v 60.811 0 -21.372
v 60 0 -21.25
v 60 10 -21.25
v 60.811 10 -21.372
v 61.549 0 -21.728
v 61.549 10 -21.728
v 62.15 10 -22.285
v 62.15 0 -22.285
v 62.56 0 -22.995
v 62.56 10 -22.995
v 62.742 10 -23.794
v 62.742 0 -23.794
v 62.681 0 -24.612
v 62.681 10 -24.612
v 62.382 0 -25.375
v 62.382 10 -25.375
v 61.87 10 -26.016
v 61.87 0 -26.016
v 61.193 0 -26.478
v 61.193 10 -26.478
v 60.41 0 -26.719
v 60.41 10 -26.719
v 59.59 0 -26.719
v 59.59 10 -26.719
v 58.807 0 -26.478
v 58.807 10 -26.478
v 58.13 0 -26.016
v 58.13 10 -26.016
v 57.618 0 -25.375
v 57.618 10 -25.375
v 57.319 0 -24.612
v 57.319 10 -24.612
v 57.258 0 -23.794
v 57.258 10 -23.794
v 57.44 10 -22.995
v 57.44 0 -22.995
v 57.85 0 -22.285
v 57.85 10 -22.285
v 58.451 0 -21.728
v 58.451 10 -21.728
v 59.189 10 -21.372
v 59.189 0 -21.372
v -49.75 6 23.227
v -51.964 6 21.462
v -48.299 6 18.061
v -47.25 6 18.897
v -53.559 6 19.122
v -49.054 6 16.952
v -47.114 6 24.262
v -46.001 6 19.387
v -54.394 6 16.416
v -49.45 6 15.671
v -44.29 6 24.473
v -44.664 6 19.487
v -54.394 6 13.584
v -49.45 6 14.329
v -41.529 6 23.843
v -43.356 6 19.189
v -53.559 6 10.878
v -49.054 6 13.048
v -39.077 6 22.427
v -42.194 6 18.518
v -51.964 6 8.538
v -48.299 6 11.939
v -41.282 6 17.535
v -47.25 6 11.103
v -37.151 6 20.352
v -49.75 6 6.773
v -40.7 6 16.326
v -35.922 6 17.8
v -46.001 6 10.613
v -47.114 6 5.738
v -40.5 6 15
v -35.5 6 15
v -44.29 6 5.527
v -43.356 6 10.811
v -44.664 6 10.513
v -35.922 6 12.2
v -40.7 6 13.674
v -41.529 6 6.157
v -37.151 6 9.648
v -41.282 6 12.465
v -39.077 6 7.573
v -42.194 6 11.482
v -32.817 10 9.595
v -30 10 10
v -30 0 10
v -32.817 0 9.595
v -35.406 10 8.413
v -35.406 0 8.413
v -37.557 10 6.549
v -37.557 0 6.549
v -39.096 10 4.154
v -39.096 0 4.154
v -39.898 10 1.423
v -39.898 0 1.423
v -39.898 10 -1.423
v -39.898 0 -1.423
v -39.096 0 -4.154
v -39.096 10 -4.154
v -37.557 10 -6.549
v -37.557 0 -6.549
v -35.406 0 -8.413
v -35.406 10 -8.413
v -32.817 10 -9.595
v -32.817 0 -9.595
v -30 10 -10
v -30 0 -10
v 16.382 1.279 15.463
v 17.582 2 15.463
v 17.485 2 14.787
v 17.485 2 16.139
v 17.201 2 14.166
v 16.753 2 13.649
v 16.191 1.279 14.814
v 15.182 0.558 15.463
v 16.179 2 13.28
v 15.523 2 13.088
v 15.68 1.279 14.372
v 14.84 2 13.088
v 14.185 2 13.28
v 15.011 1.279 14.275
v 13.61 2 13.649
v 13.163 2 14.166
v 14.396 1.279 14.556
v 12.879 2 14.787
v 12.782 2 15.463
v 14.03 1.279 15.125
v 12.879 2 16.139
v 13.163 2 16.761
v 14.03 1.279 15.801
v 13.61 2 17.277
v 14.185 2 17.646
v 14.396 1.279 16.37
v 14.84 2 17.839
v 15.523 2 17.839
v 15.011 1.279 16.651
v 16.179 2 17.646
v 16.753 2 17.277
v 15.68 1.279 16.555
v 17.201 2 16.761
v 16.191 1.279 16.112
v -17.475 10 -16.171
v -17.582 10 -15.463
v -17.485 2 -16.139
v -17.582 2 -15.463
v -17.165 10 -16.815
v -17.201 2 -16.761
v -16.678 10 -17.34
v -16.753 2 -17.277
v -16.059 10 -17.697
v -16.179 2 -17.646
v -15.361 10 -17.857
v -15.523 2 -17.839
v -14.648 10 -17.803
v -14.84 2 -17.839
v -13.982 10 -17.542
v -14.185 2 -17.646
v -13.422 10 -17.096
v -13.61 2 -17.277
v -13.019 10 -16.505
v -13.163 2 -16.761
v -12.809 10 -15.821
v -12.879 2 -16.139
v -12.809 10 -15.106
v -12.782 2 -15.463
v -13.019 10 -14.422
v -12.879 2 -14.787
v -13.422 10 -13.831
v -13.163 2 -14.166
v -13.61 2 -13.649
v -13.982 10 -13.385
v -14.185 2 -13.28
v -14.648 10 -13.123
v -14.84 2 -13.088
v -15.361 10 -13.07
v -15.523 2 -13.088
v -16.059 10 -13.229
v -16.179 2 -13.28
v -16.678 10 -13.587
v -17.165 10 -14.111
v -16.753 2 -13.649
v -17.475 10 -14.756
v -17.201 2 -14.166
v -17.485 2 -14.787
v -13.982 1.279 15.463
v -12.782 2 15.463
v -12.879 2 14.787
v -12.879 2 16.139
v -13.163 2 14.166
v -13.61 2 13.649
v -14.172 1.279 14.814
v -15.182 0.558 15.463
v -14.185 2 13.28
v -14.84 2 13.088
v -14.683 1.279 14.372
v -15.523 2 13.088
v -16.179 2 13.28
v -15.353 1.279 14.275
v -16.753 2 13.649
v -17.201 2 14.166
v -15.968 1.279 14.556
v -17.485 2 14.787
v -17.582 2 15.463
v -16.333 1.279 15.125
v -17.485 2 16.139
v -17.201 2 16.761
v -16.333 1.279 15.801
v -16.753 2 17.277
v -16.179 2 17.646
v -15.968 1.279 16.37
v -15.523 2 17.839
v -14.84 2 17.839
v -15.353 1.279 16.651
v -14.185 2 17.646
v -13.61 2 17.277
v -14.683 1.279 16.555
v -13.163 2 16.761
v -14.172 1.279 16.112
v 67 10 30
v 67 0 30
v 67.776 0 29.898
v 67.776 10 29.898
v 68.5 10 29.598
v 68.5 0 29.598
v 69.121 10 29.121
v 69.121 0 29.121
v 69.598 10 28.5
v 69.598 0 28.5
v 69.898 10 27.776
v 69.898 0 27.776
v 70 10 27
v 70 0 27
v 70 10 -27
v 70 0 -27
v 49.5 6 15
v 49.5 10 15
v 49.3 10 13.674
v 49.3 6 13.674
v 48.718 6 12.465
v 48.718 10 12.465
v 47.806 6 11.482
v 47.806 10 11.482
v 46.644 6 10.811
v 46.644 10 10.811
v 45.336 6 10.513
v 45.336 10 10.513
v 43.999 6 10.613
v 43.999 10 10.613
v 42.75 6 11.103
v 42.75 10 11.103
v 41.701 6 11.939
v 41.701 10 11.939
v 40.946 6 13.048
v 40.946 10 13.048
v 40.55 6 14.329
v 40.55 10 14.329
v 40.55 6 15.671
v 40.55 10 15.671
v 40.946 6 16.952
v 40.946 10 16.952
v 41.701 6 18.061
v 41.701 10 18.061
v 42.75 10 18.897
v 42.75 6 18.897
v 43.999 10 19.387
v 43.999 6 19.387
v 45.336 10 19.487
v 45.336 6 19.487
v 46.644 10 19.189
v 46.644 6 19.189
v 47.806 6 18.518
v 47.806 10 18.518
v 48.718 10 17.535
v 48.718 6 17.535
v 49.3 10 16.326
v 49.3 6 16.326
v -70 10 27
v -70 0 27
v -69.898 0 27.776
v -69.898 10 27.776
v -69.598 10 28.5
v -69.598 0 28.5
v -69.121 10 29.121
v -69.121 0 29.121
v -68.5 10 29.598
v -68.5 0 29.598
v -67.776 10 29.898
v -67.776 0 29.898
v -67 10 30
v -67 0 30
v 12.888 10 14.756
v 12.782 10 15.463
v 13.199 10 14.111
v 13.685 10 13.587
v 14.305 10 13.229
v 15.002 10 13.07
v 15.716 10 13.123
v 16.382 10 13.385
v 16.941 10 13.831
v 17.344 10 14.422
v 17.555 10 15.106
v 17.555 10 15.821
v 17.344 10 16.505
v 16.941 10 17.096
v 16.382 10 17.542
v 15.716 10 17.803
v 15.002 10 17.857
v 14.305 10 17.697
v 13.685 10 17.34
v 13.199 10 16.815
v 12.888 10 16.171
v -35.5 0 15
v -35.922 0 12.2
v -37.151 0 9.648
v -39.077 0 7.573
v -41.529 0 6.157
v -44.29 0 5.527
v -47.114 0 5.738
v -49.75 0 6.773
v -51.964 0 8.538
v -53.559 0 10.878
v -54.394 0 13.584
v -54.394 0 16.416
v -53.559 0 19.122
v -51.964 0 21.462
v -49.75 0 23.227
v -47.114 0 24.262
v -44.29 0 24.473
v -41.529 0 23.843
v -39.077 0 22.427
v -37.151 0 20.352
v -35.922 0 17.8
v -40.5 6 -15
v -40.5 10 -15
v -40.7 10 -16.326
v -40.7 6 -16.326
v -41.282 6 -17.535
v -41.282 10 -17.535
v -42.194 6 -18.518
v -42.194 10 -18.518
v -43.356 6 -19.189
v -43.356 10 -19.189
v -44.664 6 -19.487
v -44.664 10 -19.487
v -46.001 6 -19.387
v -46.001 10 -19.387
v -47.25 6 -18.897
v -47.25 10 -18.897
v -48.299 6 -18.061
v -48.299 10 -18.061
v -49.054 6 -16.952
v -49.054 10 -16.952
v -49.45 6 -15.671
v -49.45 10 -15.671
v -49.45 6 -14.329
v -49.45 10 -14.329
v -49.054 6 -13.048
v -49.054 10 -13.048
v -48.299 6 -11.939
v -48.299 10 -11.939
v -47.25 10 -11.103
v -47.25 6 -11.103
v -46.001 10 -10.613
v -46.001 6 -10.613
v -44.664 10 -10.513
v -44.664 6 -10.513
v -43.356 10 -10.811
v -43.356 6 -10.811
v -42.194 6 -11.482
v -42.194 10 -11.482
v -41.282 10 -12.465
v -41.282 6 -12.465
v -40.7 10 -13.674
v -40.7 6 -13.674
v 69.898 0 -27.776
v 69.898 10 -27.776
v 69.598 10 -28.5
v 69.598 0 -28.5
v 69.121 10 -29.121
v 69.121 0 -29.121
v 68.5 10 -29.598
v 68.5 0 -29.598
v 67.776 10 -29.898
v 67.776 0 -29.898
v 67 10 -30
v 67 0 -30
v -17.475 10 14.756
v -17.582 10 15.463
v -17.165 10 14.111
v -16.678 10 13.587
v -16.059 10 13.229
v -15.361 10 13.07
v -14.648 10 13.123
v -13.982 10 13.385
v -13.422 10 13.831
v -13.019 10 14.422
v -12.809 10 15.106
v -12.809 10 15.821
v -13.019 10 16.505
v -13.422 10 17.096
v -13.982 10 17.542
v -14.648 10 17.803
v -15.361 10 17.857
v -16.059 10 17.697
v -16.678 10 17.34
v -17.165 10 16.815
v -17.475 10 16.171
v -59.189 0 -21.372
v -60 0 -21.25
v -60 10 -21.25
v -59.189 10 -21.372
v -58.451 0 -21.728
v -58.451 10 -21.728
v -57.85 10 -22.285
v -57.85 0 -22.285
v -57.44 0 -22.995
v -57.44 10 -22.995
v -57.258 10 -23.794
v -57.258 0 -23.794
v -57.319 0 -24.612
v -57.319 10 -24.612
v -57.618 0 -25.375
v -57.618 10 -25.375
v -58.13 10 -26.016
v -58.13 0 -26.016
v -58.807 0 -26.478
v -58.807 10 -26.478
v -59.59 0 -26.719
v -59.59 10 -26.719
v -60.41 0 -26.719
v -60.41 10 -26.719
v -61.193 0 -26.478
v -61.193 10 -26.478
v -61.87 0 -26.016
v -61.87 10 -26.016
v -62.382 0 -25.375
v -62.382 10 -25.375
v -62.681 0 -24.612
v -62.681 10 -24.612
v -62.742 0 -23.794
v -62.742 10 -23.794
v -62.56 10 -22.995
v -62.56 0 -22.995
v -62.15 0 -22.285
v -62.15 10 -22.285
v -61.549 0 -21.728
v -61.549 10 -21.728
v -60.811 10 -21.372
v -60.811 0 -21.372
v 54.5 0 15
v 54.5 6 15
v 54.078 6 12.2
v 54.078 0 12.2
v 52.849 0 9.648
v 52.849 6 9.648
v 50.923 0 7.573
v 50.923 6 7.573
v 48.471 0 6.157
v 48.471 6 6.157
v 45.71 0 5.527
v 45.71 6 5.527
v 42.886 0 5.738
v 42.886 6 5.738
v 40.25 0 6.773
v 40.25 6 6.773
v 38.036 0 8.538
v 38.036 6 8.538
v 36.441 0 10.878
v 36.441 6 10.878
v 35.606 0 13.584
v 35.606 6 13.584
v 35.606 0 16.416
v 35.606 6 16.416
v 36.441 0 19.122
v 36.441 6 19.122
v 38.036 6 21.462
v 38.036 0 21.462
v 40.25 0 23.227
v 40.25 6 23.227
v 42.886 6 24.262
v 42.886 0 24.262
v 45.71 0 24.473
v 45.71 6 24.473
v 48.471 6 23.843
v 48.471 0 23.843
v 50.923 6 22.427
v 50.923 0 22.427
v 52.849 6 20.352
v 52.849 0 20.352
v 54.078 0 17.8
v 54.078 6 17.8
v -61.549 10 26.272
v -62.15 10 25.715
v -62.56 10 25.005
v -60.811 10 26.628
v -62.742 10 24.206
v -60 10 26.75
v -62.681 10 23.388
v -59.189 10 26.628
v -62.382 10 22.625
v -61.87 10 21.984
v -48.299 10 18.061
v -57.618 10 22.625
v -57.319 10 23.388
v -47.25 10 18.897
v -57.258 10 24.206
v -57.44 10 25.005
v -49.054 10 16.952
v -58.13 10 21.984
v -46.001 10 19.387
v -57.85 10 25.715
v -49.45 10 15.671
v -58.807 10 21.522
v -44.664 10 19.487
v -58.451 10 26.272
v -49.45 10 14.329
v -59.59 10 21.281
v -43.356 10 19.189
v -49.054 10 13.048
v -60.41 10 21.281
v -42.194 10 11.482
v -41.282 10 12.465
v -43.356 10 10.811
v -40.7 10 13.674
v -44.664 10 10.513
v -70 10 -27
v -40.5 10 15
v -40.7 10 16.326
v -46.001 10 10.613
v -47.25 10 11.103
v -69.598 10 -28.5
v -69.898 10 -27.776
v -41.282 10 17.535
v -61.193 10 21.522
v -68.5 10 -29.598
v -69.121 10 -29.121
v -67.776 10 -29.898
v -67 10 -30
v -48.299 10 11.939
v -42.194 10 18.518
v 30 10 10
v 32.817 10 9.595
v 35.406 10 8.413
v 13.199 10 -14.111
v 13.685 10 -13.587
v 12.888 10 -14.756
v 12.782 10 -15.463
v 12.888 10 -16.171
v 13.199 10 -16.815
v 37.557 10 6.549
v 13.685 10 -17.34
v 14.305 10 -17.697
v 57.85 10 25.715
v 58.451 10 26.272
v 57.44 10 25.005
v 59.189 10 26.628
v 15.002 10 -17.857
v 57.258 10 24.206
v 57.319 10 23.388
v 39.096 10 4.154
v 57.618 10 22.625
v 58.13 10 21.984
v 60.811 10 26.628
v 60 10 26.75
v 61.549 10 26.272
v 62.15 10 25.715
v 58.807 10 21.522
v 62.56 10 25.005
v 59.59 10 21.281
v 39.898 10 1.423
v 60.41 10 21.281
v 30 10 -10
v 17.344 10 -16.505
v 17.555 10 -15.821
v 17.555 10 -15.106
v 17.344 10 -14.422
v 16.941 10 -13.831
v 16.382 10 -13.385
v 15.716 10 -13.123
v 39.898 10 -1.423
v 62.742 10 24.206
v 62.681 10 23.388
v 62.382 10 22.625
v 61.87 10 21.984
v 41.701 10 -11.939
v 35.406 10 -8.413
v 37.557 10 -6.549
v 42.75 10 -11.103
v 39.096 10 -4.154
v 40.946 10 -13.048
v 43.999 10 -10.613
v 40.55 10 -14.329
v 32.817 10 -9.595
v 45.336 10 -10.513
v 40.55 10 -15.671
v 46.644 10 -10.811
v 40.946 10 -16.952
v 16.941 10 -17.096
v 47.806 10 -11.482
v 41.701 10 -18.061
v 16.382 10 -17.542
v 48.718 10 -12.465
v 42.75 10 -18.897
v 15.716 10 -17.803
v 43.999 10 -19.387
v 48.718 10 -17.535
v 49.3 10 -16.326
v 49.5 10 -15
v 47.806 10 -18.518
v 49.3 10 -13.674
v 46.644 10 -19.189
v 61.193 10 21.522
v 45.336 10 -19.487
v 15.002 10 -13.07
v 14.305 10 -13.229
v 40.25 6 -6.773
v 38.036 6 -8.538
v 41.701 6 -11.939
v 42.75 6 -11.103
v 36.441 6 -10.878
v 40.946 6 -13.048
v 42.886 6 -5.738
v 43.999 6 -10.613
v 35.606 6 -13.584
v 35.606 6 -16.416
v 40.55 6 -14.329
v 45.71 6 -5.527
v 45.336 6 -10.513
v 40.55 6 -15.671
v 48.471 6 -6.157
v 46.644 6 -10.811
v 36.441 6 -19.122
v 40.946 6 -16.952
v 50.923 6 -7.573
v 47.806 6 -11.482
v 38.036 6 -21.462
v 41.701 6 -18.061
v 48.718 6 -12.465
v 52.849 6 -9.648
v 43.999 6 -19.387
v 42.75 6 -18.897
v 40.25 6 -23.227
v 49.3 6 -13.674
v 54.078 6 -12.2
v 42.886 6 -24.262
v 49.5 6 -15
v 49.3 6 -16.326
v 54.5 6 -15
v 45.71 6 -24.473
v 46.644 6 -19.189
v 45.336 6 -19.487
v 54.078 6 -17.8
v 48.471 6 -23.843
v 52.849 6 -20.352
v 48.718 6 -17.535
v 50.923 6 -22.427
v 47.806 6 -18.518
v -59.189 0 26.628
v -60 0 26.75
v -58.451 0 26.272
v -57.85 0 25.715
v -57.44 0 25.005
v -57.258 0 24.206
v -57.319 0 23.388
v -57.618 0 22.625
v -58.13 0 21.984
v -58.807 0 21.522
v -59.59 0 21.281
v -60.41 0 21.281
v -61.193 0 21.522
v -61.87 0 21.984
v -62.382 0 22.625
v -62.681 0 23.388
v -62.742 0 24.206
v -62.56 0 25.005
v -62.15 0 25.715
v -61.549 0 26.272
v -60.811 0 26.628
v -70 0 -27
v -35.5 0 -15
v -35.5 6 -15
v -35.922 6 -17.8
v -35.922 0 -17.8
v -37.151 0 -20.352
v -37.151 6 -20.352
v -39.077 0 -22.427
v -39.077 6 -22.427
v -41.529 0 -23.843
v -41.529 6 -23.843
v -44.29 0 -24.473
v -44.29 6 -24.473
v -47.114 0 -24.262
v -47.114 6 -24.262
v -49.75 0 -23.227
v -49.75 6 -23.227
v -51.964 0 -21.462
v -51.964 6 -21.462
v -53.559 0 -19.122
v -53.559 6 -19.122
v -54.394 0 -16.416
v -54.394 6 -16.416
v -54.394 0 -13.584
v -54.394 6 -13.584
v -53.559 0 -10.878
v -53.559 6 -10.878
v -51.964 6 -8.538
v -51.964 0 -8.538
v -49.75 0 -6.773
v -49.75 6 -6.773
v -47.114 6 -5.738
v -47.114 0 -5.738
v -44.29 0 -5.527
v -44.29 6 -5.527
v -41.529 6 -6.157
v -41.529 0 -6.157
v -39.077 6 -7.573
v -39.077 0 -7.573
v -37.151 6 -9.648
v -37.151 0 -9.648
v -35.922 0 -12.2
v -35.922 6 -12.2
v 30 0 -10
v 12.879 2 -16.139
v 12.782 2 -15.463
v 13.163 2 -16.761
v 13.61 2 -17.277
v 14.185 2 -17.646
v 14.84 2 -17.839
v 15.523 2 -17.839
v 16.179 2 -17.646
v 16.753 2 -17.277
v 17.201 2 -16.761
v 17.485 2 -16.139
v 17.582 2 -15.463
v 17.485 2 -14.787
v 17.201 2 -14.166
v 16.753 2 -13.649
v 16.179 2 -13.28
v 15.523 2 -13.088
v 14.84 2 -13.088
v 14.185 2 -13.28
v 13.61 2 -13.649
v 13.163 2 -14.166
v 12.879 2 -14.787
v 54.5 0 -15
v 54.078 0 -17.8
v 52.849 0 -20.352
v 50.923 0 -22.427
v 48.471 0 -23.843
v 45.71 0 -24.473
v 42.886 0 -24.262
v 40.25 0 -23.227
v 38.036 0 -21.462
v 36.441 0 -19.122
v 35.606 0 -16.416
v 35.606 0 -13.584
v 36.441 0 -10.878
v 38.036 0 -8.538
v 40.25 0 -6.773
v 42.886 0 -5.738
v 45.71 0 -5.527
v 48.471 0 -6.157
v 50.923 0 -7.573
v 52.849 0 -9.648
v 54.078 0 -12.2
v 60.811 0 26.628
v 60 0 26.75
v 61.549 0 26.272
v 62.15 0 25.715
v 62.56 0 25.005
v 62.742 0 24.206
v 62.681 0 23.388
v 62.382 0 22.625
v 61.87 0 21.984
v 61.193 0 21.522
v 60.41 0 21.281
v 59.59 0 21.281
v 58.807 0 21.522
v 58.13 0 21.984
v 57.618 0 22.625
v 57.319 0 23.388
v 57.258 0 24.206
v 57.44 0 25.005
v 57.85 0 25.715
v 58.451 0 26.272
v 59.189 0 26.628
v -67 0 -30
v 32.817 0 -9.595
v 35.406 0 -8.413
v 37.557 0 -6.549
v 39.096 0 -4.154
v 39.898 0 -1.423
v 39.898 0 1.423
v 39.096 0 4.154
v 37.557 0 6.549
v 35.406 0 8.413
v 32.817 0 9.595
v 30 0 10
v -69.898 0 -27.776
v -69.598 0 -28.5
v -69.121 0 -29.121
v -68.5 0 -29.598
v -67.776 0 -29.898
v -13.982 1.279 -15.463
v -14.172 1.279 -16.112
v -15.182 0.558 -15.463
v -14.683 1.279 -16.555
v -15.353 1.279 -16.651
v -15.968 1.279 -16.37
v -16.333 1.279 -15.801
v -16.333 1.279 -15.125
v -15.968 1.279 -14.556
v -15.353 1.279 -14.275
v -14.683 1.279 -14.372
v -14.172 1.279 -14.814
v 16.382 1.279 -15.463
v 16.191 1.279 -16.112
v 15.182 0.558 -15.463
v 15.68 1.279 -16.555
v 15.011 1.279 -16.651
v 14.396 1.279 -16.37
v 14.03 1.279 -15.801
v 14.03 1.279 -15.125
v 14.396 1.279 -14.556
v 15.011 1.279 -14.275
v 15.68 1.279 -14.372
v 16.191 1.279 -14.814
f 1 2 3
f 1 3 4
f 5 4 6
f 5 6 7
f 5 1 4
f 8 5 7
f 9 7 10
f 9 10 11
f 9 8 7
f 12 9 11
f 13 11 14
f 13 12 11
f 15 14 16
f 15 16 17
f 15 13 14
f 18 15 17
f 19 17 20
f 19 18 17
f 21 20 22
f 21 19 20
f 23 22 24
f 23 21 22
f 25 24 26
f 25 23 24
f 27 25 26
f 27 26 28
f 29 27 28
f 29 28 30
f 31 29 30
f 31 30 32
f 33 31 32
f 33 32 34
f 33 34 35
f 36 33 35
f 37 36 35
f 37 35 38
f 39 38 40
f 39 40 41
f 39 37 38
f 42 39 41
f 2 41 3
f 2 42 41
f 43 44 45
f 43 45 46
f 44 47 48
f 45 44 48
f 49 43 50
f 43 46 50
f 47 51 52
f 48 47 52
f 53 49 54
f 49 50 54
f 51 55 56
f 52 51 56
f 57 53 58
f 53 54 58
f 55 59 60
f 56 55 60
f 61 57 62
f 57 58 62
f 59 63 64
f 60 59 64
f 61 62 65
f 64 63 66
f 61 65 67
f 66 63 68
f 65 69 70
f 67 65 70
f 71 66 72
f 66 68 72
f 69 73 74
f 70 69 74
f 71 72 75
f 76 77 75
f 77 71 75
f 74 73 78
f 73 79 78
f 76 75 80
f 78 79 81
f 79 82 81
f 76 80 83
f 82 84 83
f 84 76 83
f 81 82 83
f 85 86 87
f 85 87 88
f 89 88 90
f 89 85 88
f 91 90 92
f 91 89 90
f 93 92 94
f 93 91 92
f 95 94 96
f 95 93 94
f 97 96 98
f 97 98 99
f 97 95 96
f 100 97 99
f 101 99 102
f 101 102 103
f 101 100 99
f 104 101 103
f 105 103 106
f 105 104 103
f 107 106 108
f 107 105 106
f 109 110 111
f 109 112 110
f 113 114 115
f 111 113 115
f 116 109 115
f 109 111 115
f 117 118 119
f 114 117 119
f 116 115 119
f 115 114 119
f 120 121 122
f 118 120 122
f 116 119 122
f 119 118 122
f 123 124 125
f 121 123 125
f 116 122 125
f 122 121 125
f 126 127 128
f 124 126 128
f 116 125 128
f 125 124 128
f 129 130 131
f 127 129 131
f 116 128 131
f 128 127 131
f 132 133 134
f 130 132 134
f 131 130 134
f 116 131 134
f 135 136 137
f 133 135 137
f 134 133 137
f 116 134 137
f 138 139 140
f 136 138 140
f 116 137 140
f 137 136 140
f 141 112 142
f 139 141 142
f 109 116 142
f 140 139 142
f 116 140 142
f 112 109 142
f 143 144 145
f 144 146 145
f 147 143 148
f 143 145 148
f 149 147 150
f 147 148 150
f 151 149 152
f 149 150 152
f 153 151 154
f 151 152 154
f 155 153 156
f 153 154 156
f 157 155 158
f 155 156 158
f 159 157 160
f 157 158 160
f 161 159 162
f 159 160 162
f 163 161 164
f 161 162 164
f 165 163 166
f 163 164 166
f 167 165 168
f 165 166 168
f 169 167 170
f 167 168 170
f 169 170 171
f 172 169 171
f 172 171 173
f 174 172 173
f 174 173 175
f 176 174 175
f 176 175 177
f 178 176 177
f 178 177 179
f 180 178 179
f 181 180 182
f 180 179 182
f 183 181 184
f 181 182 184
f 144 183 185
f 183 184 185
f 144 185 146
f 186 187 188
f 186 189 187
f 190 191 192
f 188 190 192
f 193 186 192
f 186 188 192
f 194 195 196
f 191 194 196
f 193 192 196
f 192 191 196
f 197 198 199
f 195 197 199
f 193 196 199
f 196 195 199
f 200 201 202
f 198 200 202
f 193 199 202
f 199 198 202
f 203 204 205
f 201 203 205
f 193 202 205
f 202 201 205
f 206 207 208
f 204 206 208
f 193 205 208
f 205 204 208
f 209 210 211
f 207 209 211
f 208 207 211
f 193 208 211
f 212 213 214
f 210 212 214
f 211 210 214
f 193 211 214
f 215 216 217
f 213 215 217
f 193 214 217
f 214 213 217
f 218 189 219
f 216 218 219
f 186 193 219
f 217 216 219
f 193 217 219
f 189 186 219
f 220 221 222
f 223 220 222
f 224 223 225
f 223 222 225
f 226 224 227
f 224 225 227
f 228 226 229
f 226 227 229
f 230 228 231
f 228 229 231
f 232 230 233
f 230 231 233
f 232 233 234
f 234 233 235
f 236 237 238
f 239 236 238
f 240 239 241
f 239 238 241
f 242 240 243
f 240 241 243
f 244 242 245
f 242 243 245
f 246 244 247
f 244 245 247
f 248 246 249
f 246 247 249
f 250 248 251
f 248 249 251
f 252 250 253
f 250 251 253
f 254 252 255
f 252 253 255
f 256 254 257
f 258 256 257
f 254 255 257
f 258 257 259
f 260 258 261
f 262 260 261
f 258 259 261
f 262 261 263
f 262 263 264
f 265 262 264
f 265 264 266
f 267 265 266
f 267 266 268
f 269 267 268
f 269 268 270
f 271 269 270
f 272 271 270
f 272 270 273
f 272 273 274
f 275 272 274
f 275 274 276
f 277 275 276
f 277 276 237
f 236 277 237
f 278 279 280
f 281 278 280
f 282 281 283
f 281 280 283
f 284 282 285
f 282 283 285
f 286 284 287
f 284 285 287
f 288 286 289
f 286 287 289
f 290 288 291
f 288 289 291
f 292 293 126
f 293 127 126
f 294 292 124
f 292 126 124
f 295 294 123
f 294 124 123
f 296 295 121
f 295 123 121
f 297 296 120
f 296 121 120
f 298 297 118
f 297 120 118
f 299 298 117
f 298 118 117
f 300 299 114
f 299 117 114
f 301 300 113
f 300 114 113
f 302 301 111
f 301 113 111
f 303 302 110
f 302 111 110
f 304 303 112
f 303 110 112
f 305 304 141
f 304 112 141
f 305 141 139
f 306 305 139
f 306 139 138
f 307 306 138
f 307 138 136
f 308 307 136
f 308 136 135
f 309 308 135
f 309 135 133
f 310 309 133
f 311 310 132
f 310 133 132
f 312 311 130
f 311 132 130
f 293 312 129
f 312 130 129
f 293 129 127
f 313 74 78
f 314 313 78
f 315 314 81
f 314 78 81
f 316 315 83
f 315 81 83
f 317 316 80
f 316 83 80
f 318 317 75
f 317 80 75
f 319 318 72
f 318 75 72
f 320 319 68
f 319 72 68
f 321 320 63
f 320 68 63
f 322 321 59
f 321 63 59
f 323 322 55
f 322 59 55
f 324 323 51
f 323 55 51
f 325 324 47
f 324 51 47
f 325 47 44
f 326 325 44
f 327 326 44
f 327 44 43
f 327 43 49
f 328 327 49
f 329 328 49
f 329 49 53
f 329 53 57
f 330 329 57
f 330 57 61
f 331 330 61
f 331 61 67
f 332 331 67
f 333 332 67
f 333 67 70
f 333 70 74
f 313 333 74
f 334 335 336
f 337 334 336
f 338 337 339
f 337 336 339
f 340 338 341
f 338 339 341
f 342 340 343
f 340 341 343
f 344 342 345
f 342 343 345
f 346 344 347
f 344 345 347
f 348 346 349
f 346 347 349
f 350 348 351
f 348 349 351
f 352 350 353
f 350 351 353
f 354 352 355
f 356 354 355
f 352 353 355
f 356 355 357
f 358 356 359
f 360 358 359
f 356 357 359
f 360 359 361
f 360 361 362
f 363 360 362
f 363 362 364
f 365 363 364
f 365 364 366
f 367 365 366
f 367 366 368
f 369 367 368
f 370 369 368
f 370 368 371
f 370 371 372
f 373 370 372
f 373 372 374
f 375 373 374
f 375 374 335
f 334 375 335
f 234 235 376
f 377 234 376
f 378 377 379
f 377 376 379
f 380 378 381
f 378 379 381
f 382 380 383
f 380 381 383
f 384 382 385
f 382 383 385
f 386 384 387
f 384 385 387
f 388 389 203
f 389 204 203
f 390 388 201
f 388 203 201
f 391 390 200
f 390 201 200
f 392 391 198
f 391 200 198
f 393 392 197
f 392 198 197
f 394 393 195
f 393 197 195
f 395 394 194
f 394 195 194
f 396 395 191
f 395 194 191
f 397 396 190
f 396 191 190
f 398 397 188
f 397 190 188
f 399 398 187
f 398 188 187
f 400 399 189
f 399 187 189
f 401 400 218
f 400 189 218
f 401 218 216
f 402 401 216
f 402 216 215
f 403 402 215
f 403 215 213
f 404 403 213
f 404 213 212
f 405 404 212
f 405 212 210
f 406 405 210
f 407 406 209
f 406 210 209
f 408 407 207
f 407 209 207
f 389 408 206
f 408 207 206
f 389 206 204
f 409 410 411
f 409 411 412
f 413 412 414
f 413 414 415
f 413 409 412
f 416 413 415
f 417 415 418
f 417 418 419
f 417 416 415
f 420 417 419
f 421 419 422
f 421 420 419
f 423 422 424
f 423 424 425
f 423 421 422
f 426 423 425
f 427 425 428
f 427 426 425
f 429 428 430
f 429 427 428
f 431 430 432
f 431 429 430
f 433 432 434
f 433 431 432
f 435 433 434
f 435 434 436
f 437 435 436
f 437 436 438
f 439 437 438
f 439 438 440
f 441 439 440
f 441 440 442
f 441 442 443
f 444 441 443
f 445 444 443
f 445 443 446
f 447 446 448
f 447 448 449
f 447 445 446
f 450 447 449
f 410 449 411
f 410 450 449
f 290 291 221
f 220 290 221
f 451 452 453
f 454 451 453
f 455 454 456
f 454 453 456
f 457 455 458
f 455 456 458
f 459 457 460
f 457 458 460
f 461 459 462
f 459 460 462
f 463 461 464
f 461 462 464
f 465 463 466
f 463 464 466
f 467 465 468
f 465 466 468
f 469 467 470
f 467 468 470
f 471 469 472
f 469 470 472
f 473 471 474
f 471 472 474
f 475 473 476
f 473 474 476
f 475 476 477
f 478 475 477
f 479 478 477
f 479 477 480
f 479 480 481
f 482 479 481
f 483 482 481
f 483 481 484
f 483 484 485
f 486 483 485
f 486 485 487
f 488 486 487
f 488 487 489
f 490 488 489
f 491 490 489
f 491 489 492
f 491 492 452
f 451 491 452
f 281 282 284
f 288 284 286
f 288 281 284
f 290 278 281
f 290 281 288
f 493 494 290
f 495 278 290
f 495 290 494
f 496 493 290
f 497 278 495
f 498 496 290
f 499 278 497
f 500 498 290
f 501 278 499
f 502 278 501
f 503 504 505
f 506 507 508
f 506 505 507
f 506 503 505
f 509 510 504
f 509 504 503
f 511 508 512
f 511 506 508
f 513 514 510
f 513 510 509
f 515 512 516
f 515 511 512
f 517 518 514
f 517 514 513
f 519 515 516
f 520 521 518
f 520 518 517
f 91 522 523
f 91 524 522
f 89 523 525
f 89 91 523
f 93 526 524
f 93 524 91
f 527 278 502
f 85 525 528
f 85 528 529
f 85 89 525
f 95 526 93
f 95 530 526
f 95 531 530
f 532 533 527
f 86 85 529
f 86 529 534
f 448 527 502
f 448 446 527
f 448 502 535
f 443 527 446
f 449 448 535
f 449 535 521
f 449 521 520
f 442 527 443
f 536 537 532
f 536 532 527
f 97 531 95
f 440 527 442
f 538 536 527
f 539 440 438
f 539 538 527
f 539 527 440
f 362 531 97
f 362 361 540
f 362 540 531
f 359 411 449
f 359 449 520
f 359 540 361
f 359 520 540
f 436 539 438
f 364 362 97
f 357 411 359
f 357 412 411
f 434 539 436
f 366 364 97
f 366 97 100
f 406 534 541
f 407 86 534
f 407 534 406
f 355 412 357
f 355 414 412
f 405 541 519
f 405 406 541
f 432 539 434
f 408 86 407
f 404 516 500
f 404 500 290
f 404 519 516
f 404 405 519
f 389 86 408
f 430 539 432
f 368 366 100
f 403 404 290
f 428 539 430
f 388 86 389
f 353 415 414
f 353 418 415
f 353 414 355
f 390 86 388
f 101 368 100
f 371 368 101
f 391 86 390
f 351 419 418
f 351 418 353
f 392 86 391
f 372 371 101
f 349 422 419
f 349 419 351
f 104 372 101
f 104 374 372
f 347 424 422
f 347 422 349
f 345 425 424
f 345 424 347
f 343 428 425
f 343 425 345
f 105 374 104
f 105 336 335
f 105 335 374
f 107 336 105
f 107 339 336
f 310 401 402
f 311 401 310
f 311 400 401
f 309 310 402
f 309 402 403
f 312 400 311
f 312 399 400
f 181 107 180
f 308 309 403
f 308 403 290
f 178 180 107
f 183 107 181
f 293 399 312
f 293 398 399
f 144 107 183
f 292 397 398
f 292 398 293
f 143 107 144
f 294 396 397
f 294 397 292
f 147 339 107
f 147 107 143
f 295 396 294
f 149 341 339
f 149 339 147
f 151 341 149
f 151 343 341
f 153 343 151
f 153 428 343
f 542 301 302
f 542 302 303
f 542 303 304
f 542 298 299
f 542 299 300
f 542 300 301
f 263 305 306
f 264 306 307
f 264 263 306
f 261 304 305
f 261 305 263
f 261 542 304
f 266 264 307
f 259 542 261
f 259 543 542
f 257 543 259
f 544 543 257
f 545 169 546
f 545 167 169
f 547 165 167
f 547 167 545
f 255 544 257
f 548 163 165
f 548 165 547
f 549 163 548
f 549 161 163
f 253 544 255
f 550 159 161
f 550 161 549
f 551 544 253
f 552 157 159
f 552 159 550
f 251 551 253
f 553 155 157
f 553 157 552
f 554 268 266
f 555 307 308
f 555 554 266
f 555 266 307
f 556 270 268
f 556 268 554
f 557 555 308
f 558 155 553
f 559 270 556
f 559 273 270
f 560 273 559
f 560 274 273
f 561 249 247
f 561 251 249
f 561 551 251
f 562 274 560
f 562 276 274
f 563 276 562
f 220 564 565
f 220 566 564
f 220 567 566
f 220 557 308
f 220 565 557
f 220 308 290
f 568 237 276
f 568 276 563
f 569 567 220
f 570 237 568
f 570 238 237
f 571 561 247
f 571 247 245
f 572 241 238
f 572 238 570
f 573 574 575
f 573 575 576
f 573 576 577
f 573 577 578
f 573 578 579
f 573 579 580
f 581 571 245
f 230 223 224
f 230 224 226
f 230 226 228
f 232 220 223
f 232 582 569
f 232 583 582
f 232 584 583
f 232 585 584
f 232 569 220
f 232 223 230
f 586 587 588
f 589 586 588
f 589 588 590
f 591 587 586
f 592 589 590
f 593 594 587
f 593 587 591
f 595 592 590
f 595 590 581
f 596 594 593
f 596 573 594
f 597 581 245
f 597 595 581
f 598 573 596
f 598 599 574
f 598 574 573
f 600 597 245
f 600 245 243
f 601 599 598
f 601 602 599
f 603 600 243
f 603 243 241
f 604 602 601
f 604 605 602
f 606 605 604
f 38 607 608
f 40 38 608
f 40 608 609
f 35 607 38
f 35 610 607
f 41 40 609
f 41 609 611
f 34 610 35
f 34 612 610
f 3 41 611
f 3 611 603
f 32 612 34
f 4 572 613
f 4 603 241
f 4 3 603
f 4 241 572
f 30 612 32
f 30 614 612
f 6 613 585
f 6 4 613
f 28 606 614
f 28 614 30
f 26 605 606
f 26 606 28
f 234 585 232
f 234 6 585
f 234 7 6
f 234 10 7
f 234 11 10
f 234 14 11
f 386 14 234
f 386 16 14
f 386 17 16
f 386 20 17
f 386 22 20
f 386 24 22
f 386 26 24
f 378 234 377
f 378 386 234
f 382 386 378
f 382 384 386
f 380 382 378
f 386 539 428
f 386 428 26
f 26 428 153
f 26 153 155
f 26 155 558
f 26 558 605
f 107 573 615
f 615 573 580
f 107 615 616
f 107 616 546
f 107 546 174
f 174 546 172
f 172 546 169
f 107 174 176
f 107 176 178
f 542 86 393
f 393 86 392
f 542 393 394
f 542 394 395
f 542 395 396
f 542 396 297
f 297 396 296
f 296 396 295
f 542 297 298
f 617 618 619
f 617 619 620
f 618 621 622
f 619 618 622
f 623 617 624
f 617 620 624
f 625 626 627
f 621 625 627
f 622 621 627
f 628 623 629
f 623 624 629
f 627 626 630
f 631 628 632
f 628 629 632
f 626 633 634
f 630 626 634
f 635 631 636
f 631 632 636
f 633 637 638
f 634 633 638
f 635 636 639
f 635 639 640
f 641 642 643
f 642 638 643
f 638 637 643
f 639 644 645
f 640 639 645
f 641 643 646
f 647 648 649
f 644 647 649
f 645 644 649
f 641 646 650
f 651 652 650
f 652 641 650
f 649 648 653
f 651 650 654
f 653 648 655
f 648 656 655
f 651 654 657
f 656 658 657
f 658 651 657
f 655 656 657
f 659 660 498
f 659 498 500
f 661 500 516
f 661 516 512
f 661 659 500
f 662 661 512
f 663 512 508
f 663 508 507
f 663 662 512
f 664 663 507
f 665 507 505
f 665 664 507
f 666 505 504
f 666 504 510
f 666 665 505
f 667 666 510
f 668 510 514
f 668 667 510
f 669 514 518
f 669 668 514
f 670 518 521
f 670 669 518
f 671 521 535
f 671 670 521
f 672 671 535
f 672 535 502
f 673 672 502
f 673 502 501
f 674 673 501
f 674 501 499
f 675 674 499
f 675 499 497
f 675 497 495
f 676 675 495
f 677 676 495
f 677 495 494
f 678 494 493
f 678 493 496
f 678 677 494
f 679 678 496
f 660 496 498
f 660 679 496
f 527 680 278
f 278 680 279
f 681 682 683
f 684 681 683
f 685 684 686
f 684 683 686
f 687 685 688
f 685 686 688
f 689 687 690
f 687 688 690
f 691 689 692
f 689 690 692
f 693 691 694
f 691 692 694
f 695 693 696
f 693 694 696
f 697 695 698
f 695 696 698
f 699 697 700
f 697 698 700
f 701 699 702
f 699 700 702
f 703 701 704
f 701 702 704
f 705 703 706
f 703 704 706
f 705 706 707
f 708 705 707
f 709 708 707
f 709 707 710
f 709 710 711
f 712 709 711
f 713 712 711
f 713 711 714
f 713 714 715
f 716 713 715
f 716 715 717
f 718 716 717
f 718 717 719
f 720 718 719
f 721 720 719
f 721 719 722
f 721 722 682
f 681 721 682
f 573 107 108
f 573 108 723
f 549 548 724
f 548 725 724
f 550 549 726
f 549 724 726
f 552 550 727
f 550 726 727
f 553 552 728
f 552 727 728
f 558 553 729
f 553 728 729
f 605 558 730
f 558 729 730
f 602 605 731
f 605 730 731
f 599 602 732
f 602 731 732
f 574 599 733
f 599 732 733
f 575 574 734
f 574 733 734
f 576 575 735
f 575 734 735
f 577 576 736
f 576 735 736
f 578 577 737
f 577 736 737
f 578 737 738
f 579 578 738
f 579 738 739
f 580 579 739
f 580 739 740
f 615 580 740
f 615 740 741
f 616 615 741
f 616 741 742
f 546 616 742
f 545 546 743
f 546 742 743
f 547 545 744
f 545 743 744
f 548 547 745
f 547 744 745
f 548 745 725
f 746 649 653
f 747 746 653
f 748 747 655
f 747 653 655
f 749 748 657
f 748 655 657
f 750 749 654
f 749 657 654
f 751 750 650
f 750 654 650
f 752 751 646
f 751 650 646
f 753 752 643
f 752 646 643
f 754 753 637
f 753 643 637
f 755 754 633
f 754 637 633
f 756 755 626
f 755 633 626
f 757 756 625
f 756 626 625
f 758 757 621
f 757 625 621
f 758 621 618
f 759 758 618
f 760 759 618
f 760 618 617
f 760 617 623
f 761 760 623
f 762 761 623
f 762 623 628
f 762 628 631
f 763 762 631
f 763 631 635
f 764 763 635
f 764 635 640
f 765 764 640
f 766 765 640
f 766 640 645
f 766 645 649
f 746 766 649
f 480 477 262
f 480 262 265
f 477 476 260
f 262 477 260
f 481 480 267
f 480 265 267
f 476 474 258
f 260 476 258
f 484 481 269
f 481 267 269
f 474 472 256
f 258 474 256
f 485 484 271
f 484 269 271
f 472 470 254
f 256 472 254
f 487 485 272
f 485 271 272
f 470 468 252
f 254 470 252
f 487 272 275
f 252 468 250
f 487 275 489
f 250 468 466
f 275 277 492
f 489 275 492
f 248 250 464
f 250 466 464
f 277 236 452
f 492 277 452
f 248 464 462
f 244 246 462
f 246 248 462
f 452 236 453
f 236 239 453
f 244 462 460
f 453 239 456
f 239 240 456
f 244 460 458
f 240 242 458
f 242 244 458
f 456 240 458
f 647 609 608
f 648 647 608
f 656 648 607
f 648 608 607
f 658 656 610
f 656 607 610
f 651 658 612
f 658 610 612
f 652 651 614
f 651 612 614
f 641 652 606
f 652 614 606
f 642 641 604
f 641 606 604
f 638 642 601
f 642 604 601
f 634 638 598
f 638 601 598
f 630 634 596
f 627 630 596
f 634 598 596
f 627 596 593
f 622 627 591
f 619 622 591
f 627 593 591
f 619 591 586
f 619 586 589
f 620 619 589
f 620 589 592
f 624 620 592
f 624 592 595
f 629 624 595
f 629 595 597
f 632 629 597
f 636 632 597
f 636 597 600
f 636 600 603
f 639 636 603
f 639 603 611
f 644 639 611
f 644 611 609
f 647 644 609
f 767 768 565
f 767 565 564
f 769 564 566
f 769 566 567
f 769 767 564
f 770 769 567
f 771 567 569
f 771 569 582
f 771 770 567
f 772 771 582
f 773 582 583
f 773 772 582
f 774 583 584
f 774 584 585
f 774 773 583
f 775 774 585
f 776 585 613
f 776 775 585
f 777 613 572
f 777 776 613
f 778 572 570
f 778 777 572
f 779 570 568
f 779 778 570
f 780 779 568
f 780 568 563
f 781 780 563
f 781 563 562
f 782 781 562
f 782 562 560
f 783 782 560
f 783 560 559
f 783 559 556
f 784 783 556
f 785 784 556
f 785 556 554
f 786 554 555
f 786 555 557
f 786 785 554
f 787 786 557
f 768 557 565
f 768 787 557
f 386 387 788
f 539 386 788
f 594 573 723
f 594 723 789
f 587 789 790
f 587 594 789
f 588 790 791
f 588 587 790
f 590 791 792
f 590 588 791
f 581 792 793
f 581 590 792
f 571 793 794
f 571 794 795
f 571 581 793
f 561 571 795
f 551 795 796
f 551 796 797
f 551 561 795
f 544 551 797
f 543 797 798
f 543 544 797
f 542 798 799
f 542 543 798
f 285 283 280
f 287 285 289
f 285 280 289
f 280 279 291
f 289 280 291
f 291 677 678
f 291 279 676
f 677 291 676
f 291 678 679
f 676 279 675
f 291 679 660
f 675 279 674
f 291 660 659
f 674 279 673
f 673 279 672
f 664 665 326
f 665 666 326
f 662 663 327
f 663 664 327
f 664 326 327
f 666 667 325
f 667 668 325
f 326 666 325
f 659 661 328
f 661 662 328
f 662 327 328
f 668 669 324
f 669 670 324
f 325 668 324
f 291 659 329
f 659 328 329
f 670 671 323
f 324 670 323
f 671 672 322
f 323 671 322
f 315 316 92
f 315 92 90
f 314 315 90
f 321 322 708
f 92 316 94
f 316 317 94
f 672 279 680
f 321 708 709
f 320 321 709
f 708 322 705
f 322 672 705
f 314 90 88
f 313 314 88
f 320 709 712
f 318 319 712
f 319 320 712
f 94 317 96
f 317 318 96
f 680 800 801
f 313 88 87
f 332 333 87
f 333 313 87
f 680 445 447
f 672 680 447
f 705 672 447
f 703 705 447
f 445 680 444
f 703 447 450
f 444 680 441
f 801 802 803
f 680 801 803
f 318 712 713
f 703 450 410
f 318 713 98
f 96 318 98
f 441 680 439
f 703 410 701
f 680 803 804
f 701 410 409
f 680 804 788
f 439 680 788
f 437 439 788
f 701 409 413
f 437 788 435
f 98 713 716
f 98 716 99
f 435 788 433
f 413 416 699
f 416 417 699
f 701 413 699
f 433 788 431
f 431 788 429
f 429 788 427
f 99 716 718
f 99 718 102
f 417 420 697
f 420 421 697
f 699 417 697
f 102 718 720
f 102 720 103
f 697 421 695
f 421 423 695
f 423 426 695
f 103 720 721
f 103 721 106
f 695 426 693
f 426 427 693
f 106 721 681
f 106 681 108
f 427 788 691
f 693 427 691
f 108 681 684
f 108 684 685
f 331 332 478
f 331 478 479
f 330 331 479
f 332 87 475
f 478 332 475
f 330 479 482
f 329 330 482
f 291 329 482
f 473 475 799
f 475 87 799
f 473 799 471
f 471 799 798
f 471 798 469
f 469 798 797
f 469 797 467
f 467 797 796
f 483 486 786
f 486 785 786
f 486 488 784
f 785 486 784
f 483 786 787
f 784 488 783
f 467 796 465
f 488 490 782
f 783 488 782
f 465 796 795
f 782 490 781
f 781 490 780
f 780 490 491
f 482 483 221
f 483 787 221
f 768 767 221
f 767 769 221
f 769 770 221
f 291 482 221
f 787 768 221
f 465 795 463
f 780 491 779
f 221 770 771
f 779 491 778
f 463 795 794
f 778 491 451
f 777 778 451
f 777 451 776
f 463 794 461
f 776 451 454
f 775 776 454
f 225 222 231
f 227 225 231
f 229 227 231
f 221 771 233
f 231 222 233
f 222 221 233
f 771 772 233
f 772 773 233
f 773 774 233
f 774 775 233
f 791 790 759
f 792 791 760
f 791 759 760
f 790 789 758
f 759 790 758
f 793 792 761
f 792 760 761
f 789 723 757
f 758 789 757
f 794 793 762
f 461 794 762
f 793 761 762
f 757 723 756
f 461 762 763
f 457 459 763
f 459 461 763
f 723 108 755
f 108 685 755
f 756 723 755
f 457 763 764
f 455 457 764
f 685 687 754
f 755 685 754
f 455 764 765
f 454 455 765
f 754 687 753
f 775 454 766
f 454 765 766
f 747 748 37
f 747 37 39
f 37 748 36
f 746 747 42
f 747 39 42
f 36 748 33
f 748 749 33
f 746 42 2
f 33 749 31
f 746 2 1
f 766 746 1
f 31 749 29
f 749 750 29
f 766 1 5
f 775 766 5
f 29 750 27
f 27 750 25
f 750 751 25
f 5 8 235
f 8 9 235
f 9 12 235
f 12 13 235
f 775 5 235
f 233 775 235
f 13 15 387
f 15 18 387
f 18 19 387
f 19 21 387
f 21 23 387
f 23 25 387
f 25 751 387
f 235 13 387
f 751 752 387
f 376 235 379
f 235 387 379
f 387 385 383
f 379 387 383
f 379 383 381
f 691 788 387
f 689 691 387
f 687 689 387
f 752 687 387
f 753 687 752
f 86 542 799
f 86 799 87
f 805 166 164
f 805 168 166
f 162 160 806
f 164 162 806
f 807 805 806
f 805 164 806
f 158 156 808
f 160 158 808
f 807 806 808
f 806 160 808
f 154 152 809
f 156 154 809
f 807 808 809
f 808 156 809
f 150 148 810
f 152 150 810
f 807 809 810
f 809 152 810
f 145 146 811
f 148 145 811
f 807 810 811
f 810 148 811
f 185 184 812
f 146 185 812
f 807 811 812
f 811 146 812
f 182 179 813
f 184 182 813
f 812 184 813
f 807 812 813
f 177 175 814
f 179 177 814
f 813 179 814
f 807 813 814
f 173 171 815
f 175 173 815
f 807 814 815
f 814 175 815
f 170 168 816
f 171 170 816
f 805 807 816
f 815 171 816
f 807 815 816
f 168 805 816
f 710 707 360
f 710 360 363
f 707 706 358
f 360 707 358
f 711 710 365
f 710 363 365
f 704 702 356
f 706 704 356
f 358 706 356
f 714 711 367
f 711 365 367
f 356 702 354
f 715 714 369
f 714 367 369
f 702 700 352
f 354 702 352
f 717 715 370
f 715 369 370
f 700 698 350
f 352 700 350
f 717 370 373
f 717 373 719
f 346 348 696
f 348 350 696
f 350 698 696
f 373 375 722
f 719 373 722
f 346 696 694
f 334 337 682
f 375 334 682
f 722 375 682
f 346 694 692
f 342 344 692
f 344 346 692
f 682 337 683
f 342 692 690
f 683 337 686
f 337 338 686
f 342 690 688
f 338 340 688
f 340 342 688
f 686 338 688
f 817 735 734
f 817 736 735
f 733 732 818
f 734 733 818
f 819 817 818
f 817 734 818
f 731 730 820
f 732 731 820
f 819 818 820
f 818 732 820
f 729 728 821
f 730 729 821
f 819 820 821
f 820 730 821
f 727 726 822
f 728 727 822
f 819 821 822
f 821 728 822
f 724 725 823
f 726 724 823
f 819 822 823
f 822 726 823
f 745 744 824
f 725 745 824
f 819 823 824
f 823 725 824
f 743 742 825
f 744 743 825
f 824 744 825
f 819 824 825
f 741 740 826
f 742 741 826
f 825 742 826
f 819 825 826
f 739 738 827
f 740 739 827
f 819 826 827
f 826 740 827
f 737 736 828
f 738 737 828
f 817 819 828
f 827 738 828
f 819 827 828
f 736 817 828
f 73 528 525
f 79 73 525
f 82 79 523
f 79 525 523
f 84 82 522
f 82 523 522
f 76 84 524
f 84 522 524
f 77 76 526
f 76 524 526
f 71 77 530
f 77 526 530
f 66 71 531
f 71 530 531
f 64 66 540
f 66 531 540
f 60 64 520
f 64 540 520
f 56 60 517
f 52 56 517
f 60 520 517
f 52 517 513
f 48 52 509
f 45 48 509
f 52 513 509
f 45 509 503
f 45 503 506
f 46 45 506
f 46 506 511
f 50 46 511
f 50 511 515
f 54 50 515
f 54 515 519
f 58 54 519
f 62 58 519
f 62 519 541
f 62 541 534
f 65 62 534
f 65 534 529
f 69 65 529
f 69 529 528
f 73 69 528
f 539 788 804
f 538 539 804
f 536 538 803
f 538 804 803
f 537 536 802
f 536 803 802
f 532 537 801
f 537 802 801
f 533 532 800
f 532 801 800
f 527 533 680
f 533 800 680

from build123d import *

# Parameters (mm, degrees)
SKETCH1_R                  = 2.75
SKETCH1_W                  = 130
SKETCH1_H                  = 38
BOSS_EXTRUDE1_DEPTH        = 10
SKETCH1_2_W                = 130
SKETCH1_2_H                = 38
BOSS_EXTRUDE2_DEPTH        = 10
M3_5_CLEARANCE_HOLE1_D     = 4.8
M3_5_CLEARANCE_HOLE1_DEPTH = 8
M3_5_CLEARANCE_HOLE1_TIP   = 1.442065486
CUT_EXTRUDE1_DEPTH         = 10
M16_CLEARANCE_HOLE1_D      = 19
M16_CLEARANCE_HOLE1_DEPTH  = 6
M8_CLEARANCE_HOLE1_D       = 9


with BuildPart() as part:
    # Sketch1 → Boss-Extrude1 (new body)
    with BuildSketch(Plane(origin=(0, 0, 0), x_dir=(1, 0, 0), z_dir=(0, 1, 0))):
        with BuildLine():
            Line((67, 30), (-67, 30))
            ThreePointArc((-67, 30), (-69.121320344, 29.121320344), (-70, 27))
            Line((-70, 27), (-70, -27))
            ThreePointArc((-70, -27), (-69.121320344, -29.121320344), (-67, -30))
            Line((-67, -30), (67, -30))
            ThreePointArc((67, -30), (69.121320344, -29.121320344), (70, -27))
            Line((70, -27), (70, 27))
            ThreePointArc((70, 27), (69.121320344, 29.121320344), (67, 30))
        make_face()
        with Locations(Location((-60, 24, 0), (0, 0, 270))):
            Circle(SKETCH1_R, mode=Mode.SUBTRACT)
        with Locations(Location((-60, -24, 0), (0, 0, 270))):
            Circle(SKETCH1_R, mode=Mode.SUBTRACT)
        with Locations(Location((60, -24, 0), (0, 0, 270))):
            Circle(SKETCH1_R, mode=Mode.SUBTRACT)
        with Locations(Location((60, 24, 0), (0, 0, 270))):
            Circle(SKETCH1_R, mode=Mode.SUBTRACT)
        Rectangle(SKETCH1_W, SKETCH1_H, mode=Mode.SUBTRACT)
    extrude(amount=BOSS_EXTRUDE1_DEPTH)

    # Sketch1<2> → Boss-Extrude2 (add)
    with BuildSketch(Plane(origin=(0, 0, 0), x_dir=(1, 0, 0), z_dir=(0, 1, 0))):
        Rectangle(SKETCH1_2_W, SKETCH1_2_H)
    extrude(amount=BOSS_EXTRUDE2_DEPTH)

    # M3.5 Clearance Hole1
    with Locations(Plane(origin=(0, 10, 0), x_dir=(1, 0, 0), z_dir=(0, 1, 0))):
        with Locations((0, 0), (-15.181752664, -15.463217926), (15.181752664, 15.463217926), (15.181752664, -15.463217926), (-15.181752664, 15.463217926)):
            Hole(M3_5_CLEARANCE_HOLE1_D / 2, depth=M3_5_CLEARANCE_HOLE1_DEPTH)
            with Locations((0, 0, -(M3_5_CLEARANCE_HOLE1_DEPTH + M3_5_CLEARANCE_HOLE1_TIP / 2))):  # 118° drill point
                Cone(0, M3_5_CLEARANCE_HOLE1_D / 2, M3_5_CLEARANCE_HOLE1_TIP, mode=Mode.SUBTRACT)

    # Sketch6 → Cut-Extrude1 (cut)
    with BuildSketch(Plane(origin=(0, 10, 0), x_dir=(1, 0, 0), z_dir=(0, 1, 0))):
        with BuildLine():
            Line((-30, 10), (30, 10))
            ThreePointArc((30, 10), (40, 0), (30, -10))
            Line((30, -10), (-30, -10))
            ThreePointArc((-30, -10), (-40, 0), (-30, 10))
        make_face()
    extrude(amount=-CUT_EXTRUDE1_DEPTH, mode=Mode.SUBTRACT)

    # M16 Clearance Hole1
    with Locations(Plane(origin=(0, 0, 0), x_dir=(-1, 0, 0), z_dir=(0, -1, 0))):
        with Locations((0, 0), (-45, -15), (45, 15), (45, -15), (-45, 15)):
            Hole(M16_CLEARANCE_HOLE1_D / 2, depth=M16_CLEARANCE_HOLE1_DEPTH)

    # M8 Clearance Hole1 (through all)
    with Locations(Plane(origin=(0, 0, 0), x_dir=(-1, 0, 0), z_dir=(0, -1, 0))):
        with Locations((45, -15), (45, 15), (-45, 15), (-45, -15)):
            Hole(M8_CLEARANCE_HOLE1_D / 2)


solid = part.part
